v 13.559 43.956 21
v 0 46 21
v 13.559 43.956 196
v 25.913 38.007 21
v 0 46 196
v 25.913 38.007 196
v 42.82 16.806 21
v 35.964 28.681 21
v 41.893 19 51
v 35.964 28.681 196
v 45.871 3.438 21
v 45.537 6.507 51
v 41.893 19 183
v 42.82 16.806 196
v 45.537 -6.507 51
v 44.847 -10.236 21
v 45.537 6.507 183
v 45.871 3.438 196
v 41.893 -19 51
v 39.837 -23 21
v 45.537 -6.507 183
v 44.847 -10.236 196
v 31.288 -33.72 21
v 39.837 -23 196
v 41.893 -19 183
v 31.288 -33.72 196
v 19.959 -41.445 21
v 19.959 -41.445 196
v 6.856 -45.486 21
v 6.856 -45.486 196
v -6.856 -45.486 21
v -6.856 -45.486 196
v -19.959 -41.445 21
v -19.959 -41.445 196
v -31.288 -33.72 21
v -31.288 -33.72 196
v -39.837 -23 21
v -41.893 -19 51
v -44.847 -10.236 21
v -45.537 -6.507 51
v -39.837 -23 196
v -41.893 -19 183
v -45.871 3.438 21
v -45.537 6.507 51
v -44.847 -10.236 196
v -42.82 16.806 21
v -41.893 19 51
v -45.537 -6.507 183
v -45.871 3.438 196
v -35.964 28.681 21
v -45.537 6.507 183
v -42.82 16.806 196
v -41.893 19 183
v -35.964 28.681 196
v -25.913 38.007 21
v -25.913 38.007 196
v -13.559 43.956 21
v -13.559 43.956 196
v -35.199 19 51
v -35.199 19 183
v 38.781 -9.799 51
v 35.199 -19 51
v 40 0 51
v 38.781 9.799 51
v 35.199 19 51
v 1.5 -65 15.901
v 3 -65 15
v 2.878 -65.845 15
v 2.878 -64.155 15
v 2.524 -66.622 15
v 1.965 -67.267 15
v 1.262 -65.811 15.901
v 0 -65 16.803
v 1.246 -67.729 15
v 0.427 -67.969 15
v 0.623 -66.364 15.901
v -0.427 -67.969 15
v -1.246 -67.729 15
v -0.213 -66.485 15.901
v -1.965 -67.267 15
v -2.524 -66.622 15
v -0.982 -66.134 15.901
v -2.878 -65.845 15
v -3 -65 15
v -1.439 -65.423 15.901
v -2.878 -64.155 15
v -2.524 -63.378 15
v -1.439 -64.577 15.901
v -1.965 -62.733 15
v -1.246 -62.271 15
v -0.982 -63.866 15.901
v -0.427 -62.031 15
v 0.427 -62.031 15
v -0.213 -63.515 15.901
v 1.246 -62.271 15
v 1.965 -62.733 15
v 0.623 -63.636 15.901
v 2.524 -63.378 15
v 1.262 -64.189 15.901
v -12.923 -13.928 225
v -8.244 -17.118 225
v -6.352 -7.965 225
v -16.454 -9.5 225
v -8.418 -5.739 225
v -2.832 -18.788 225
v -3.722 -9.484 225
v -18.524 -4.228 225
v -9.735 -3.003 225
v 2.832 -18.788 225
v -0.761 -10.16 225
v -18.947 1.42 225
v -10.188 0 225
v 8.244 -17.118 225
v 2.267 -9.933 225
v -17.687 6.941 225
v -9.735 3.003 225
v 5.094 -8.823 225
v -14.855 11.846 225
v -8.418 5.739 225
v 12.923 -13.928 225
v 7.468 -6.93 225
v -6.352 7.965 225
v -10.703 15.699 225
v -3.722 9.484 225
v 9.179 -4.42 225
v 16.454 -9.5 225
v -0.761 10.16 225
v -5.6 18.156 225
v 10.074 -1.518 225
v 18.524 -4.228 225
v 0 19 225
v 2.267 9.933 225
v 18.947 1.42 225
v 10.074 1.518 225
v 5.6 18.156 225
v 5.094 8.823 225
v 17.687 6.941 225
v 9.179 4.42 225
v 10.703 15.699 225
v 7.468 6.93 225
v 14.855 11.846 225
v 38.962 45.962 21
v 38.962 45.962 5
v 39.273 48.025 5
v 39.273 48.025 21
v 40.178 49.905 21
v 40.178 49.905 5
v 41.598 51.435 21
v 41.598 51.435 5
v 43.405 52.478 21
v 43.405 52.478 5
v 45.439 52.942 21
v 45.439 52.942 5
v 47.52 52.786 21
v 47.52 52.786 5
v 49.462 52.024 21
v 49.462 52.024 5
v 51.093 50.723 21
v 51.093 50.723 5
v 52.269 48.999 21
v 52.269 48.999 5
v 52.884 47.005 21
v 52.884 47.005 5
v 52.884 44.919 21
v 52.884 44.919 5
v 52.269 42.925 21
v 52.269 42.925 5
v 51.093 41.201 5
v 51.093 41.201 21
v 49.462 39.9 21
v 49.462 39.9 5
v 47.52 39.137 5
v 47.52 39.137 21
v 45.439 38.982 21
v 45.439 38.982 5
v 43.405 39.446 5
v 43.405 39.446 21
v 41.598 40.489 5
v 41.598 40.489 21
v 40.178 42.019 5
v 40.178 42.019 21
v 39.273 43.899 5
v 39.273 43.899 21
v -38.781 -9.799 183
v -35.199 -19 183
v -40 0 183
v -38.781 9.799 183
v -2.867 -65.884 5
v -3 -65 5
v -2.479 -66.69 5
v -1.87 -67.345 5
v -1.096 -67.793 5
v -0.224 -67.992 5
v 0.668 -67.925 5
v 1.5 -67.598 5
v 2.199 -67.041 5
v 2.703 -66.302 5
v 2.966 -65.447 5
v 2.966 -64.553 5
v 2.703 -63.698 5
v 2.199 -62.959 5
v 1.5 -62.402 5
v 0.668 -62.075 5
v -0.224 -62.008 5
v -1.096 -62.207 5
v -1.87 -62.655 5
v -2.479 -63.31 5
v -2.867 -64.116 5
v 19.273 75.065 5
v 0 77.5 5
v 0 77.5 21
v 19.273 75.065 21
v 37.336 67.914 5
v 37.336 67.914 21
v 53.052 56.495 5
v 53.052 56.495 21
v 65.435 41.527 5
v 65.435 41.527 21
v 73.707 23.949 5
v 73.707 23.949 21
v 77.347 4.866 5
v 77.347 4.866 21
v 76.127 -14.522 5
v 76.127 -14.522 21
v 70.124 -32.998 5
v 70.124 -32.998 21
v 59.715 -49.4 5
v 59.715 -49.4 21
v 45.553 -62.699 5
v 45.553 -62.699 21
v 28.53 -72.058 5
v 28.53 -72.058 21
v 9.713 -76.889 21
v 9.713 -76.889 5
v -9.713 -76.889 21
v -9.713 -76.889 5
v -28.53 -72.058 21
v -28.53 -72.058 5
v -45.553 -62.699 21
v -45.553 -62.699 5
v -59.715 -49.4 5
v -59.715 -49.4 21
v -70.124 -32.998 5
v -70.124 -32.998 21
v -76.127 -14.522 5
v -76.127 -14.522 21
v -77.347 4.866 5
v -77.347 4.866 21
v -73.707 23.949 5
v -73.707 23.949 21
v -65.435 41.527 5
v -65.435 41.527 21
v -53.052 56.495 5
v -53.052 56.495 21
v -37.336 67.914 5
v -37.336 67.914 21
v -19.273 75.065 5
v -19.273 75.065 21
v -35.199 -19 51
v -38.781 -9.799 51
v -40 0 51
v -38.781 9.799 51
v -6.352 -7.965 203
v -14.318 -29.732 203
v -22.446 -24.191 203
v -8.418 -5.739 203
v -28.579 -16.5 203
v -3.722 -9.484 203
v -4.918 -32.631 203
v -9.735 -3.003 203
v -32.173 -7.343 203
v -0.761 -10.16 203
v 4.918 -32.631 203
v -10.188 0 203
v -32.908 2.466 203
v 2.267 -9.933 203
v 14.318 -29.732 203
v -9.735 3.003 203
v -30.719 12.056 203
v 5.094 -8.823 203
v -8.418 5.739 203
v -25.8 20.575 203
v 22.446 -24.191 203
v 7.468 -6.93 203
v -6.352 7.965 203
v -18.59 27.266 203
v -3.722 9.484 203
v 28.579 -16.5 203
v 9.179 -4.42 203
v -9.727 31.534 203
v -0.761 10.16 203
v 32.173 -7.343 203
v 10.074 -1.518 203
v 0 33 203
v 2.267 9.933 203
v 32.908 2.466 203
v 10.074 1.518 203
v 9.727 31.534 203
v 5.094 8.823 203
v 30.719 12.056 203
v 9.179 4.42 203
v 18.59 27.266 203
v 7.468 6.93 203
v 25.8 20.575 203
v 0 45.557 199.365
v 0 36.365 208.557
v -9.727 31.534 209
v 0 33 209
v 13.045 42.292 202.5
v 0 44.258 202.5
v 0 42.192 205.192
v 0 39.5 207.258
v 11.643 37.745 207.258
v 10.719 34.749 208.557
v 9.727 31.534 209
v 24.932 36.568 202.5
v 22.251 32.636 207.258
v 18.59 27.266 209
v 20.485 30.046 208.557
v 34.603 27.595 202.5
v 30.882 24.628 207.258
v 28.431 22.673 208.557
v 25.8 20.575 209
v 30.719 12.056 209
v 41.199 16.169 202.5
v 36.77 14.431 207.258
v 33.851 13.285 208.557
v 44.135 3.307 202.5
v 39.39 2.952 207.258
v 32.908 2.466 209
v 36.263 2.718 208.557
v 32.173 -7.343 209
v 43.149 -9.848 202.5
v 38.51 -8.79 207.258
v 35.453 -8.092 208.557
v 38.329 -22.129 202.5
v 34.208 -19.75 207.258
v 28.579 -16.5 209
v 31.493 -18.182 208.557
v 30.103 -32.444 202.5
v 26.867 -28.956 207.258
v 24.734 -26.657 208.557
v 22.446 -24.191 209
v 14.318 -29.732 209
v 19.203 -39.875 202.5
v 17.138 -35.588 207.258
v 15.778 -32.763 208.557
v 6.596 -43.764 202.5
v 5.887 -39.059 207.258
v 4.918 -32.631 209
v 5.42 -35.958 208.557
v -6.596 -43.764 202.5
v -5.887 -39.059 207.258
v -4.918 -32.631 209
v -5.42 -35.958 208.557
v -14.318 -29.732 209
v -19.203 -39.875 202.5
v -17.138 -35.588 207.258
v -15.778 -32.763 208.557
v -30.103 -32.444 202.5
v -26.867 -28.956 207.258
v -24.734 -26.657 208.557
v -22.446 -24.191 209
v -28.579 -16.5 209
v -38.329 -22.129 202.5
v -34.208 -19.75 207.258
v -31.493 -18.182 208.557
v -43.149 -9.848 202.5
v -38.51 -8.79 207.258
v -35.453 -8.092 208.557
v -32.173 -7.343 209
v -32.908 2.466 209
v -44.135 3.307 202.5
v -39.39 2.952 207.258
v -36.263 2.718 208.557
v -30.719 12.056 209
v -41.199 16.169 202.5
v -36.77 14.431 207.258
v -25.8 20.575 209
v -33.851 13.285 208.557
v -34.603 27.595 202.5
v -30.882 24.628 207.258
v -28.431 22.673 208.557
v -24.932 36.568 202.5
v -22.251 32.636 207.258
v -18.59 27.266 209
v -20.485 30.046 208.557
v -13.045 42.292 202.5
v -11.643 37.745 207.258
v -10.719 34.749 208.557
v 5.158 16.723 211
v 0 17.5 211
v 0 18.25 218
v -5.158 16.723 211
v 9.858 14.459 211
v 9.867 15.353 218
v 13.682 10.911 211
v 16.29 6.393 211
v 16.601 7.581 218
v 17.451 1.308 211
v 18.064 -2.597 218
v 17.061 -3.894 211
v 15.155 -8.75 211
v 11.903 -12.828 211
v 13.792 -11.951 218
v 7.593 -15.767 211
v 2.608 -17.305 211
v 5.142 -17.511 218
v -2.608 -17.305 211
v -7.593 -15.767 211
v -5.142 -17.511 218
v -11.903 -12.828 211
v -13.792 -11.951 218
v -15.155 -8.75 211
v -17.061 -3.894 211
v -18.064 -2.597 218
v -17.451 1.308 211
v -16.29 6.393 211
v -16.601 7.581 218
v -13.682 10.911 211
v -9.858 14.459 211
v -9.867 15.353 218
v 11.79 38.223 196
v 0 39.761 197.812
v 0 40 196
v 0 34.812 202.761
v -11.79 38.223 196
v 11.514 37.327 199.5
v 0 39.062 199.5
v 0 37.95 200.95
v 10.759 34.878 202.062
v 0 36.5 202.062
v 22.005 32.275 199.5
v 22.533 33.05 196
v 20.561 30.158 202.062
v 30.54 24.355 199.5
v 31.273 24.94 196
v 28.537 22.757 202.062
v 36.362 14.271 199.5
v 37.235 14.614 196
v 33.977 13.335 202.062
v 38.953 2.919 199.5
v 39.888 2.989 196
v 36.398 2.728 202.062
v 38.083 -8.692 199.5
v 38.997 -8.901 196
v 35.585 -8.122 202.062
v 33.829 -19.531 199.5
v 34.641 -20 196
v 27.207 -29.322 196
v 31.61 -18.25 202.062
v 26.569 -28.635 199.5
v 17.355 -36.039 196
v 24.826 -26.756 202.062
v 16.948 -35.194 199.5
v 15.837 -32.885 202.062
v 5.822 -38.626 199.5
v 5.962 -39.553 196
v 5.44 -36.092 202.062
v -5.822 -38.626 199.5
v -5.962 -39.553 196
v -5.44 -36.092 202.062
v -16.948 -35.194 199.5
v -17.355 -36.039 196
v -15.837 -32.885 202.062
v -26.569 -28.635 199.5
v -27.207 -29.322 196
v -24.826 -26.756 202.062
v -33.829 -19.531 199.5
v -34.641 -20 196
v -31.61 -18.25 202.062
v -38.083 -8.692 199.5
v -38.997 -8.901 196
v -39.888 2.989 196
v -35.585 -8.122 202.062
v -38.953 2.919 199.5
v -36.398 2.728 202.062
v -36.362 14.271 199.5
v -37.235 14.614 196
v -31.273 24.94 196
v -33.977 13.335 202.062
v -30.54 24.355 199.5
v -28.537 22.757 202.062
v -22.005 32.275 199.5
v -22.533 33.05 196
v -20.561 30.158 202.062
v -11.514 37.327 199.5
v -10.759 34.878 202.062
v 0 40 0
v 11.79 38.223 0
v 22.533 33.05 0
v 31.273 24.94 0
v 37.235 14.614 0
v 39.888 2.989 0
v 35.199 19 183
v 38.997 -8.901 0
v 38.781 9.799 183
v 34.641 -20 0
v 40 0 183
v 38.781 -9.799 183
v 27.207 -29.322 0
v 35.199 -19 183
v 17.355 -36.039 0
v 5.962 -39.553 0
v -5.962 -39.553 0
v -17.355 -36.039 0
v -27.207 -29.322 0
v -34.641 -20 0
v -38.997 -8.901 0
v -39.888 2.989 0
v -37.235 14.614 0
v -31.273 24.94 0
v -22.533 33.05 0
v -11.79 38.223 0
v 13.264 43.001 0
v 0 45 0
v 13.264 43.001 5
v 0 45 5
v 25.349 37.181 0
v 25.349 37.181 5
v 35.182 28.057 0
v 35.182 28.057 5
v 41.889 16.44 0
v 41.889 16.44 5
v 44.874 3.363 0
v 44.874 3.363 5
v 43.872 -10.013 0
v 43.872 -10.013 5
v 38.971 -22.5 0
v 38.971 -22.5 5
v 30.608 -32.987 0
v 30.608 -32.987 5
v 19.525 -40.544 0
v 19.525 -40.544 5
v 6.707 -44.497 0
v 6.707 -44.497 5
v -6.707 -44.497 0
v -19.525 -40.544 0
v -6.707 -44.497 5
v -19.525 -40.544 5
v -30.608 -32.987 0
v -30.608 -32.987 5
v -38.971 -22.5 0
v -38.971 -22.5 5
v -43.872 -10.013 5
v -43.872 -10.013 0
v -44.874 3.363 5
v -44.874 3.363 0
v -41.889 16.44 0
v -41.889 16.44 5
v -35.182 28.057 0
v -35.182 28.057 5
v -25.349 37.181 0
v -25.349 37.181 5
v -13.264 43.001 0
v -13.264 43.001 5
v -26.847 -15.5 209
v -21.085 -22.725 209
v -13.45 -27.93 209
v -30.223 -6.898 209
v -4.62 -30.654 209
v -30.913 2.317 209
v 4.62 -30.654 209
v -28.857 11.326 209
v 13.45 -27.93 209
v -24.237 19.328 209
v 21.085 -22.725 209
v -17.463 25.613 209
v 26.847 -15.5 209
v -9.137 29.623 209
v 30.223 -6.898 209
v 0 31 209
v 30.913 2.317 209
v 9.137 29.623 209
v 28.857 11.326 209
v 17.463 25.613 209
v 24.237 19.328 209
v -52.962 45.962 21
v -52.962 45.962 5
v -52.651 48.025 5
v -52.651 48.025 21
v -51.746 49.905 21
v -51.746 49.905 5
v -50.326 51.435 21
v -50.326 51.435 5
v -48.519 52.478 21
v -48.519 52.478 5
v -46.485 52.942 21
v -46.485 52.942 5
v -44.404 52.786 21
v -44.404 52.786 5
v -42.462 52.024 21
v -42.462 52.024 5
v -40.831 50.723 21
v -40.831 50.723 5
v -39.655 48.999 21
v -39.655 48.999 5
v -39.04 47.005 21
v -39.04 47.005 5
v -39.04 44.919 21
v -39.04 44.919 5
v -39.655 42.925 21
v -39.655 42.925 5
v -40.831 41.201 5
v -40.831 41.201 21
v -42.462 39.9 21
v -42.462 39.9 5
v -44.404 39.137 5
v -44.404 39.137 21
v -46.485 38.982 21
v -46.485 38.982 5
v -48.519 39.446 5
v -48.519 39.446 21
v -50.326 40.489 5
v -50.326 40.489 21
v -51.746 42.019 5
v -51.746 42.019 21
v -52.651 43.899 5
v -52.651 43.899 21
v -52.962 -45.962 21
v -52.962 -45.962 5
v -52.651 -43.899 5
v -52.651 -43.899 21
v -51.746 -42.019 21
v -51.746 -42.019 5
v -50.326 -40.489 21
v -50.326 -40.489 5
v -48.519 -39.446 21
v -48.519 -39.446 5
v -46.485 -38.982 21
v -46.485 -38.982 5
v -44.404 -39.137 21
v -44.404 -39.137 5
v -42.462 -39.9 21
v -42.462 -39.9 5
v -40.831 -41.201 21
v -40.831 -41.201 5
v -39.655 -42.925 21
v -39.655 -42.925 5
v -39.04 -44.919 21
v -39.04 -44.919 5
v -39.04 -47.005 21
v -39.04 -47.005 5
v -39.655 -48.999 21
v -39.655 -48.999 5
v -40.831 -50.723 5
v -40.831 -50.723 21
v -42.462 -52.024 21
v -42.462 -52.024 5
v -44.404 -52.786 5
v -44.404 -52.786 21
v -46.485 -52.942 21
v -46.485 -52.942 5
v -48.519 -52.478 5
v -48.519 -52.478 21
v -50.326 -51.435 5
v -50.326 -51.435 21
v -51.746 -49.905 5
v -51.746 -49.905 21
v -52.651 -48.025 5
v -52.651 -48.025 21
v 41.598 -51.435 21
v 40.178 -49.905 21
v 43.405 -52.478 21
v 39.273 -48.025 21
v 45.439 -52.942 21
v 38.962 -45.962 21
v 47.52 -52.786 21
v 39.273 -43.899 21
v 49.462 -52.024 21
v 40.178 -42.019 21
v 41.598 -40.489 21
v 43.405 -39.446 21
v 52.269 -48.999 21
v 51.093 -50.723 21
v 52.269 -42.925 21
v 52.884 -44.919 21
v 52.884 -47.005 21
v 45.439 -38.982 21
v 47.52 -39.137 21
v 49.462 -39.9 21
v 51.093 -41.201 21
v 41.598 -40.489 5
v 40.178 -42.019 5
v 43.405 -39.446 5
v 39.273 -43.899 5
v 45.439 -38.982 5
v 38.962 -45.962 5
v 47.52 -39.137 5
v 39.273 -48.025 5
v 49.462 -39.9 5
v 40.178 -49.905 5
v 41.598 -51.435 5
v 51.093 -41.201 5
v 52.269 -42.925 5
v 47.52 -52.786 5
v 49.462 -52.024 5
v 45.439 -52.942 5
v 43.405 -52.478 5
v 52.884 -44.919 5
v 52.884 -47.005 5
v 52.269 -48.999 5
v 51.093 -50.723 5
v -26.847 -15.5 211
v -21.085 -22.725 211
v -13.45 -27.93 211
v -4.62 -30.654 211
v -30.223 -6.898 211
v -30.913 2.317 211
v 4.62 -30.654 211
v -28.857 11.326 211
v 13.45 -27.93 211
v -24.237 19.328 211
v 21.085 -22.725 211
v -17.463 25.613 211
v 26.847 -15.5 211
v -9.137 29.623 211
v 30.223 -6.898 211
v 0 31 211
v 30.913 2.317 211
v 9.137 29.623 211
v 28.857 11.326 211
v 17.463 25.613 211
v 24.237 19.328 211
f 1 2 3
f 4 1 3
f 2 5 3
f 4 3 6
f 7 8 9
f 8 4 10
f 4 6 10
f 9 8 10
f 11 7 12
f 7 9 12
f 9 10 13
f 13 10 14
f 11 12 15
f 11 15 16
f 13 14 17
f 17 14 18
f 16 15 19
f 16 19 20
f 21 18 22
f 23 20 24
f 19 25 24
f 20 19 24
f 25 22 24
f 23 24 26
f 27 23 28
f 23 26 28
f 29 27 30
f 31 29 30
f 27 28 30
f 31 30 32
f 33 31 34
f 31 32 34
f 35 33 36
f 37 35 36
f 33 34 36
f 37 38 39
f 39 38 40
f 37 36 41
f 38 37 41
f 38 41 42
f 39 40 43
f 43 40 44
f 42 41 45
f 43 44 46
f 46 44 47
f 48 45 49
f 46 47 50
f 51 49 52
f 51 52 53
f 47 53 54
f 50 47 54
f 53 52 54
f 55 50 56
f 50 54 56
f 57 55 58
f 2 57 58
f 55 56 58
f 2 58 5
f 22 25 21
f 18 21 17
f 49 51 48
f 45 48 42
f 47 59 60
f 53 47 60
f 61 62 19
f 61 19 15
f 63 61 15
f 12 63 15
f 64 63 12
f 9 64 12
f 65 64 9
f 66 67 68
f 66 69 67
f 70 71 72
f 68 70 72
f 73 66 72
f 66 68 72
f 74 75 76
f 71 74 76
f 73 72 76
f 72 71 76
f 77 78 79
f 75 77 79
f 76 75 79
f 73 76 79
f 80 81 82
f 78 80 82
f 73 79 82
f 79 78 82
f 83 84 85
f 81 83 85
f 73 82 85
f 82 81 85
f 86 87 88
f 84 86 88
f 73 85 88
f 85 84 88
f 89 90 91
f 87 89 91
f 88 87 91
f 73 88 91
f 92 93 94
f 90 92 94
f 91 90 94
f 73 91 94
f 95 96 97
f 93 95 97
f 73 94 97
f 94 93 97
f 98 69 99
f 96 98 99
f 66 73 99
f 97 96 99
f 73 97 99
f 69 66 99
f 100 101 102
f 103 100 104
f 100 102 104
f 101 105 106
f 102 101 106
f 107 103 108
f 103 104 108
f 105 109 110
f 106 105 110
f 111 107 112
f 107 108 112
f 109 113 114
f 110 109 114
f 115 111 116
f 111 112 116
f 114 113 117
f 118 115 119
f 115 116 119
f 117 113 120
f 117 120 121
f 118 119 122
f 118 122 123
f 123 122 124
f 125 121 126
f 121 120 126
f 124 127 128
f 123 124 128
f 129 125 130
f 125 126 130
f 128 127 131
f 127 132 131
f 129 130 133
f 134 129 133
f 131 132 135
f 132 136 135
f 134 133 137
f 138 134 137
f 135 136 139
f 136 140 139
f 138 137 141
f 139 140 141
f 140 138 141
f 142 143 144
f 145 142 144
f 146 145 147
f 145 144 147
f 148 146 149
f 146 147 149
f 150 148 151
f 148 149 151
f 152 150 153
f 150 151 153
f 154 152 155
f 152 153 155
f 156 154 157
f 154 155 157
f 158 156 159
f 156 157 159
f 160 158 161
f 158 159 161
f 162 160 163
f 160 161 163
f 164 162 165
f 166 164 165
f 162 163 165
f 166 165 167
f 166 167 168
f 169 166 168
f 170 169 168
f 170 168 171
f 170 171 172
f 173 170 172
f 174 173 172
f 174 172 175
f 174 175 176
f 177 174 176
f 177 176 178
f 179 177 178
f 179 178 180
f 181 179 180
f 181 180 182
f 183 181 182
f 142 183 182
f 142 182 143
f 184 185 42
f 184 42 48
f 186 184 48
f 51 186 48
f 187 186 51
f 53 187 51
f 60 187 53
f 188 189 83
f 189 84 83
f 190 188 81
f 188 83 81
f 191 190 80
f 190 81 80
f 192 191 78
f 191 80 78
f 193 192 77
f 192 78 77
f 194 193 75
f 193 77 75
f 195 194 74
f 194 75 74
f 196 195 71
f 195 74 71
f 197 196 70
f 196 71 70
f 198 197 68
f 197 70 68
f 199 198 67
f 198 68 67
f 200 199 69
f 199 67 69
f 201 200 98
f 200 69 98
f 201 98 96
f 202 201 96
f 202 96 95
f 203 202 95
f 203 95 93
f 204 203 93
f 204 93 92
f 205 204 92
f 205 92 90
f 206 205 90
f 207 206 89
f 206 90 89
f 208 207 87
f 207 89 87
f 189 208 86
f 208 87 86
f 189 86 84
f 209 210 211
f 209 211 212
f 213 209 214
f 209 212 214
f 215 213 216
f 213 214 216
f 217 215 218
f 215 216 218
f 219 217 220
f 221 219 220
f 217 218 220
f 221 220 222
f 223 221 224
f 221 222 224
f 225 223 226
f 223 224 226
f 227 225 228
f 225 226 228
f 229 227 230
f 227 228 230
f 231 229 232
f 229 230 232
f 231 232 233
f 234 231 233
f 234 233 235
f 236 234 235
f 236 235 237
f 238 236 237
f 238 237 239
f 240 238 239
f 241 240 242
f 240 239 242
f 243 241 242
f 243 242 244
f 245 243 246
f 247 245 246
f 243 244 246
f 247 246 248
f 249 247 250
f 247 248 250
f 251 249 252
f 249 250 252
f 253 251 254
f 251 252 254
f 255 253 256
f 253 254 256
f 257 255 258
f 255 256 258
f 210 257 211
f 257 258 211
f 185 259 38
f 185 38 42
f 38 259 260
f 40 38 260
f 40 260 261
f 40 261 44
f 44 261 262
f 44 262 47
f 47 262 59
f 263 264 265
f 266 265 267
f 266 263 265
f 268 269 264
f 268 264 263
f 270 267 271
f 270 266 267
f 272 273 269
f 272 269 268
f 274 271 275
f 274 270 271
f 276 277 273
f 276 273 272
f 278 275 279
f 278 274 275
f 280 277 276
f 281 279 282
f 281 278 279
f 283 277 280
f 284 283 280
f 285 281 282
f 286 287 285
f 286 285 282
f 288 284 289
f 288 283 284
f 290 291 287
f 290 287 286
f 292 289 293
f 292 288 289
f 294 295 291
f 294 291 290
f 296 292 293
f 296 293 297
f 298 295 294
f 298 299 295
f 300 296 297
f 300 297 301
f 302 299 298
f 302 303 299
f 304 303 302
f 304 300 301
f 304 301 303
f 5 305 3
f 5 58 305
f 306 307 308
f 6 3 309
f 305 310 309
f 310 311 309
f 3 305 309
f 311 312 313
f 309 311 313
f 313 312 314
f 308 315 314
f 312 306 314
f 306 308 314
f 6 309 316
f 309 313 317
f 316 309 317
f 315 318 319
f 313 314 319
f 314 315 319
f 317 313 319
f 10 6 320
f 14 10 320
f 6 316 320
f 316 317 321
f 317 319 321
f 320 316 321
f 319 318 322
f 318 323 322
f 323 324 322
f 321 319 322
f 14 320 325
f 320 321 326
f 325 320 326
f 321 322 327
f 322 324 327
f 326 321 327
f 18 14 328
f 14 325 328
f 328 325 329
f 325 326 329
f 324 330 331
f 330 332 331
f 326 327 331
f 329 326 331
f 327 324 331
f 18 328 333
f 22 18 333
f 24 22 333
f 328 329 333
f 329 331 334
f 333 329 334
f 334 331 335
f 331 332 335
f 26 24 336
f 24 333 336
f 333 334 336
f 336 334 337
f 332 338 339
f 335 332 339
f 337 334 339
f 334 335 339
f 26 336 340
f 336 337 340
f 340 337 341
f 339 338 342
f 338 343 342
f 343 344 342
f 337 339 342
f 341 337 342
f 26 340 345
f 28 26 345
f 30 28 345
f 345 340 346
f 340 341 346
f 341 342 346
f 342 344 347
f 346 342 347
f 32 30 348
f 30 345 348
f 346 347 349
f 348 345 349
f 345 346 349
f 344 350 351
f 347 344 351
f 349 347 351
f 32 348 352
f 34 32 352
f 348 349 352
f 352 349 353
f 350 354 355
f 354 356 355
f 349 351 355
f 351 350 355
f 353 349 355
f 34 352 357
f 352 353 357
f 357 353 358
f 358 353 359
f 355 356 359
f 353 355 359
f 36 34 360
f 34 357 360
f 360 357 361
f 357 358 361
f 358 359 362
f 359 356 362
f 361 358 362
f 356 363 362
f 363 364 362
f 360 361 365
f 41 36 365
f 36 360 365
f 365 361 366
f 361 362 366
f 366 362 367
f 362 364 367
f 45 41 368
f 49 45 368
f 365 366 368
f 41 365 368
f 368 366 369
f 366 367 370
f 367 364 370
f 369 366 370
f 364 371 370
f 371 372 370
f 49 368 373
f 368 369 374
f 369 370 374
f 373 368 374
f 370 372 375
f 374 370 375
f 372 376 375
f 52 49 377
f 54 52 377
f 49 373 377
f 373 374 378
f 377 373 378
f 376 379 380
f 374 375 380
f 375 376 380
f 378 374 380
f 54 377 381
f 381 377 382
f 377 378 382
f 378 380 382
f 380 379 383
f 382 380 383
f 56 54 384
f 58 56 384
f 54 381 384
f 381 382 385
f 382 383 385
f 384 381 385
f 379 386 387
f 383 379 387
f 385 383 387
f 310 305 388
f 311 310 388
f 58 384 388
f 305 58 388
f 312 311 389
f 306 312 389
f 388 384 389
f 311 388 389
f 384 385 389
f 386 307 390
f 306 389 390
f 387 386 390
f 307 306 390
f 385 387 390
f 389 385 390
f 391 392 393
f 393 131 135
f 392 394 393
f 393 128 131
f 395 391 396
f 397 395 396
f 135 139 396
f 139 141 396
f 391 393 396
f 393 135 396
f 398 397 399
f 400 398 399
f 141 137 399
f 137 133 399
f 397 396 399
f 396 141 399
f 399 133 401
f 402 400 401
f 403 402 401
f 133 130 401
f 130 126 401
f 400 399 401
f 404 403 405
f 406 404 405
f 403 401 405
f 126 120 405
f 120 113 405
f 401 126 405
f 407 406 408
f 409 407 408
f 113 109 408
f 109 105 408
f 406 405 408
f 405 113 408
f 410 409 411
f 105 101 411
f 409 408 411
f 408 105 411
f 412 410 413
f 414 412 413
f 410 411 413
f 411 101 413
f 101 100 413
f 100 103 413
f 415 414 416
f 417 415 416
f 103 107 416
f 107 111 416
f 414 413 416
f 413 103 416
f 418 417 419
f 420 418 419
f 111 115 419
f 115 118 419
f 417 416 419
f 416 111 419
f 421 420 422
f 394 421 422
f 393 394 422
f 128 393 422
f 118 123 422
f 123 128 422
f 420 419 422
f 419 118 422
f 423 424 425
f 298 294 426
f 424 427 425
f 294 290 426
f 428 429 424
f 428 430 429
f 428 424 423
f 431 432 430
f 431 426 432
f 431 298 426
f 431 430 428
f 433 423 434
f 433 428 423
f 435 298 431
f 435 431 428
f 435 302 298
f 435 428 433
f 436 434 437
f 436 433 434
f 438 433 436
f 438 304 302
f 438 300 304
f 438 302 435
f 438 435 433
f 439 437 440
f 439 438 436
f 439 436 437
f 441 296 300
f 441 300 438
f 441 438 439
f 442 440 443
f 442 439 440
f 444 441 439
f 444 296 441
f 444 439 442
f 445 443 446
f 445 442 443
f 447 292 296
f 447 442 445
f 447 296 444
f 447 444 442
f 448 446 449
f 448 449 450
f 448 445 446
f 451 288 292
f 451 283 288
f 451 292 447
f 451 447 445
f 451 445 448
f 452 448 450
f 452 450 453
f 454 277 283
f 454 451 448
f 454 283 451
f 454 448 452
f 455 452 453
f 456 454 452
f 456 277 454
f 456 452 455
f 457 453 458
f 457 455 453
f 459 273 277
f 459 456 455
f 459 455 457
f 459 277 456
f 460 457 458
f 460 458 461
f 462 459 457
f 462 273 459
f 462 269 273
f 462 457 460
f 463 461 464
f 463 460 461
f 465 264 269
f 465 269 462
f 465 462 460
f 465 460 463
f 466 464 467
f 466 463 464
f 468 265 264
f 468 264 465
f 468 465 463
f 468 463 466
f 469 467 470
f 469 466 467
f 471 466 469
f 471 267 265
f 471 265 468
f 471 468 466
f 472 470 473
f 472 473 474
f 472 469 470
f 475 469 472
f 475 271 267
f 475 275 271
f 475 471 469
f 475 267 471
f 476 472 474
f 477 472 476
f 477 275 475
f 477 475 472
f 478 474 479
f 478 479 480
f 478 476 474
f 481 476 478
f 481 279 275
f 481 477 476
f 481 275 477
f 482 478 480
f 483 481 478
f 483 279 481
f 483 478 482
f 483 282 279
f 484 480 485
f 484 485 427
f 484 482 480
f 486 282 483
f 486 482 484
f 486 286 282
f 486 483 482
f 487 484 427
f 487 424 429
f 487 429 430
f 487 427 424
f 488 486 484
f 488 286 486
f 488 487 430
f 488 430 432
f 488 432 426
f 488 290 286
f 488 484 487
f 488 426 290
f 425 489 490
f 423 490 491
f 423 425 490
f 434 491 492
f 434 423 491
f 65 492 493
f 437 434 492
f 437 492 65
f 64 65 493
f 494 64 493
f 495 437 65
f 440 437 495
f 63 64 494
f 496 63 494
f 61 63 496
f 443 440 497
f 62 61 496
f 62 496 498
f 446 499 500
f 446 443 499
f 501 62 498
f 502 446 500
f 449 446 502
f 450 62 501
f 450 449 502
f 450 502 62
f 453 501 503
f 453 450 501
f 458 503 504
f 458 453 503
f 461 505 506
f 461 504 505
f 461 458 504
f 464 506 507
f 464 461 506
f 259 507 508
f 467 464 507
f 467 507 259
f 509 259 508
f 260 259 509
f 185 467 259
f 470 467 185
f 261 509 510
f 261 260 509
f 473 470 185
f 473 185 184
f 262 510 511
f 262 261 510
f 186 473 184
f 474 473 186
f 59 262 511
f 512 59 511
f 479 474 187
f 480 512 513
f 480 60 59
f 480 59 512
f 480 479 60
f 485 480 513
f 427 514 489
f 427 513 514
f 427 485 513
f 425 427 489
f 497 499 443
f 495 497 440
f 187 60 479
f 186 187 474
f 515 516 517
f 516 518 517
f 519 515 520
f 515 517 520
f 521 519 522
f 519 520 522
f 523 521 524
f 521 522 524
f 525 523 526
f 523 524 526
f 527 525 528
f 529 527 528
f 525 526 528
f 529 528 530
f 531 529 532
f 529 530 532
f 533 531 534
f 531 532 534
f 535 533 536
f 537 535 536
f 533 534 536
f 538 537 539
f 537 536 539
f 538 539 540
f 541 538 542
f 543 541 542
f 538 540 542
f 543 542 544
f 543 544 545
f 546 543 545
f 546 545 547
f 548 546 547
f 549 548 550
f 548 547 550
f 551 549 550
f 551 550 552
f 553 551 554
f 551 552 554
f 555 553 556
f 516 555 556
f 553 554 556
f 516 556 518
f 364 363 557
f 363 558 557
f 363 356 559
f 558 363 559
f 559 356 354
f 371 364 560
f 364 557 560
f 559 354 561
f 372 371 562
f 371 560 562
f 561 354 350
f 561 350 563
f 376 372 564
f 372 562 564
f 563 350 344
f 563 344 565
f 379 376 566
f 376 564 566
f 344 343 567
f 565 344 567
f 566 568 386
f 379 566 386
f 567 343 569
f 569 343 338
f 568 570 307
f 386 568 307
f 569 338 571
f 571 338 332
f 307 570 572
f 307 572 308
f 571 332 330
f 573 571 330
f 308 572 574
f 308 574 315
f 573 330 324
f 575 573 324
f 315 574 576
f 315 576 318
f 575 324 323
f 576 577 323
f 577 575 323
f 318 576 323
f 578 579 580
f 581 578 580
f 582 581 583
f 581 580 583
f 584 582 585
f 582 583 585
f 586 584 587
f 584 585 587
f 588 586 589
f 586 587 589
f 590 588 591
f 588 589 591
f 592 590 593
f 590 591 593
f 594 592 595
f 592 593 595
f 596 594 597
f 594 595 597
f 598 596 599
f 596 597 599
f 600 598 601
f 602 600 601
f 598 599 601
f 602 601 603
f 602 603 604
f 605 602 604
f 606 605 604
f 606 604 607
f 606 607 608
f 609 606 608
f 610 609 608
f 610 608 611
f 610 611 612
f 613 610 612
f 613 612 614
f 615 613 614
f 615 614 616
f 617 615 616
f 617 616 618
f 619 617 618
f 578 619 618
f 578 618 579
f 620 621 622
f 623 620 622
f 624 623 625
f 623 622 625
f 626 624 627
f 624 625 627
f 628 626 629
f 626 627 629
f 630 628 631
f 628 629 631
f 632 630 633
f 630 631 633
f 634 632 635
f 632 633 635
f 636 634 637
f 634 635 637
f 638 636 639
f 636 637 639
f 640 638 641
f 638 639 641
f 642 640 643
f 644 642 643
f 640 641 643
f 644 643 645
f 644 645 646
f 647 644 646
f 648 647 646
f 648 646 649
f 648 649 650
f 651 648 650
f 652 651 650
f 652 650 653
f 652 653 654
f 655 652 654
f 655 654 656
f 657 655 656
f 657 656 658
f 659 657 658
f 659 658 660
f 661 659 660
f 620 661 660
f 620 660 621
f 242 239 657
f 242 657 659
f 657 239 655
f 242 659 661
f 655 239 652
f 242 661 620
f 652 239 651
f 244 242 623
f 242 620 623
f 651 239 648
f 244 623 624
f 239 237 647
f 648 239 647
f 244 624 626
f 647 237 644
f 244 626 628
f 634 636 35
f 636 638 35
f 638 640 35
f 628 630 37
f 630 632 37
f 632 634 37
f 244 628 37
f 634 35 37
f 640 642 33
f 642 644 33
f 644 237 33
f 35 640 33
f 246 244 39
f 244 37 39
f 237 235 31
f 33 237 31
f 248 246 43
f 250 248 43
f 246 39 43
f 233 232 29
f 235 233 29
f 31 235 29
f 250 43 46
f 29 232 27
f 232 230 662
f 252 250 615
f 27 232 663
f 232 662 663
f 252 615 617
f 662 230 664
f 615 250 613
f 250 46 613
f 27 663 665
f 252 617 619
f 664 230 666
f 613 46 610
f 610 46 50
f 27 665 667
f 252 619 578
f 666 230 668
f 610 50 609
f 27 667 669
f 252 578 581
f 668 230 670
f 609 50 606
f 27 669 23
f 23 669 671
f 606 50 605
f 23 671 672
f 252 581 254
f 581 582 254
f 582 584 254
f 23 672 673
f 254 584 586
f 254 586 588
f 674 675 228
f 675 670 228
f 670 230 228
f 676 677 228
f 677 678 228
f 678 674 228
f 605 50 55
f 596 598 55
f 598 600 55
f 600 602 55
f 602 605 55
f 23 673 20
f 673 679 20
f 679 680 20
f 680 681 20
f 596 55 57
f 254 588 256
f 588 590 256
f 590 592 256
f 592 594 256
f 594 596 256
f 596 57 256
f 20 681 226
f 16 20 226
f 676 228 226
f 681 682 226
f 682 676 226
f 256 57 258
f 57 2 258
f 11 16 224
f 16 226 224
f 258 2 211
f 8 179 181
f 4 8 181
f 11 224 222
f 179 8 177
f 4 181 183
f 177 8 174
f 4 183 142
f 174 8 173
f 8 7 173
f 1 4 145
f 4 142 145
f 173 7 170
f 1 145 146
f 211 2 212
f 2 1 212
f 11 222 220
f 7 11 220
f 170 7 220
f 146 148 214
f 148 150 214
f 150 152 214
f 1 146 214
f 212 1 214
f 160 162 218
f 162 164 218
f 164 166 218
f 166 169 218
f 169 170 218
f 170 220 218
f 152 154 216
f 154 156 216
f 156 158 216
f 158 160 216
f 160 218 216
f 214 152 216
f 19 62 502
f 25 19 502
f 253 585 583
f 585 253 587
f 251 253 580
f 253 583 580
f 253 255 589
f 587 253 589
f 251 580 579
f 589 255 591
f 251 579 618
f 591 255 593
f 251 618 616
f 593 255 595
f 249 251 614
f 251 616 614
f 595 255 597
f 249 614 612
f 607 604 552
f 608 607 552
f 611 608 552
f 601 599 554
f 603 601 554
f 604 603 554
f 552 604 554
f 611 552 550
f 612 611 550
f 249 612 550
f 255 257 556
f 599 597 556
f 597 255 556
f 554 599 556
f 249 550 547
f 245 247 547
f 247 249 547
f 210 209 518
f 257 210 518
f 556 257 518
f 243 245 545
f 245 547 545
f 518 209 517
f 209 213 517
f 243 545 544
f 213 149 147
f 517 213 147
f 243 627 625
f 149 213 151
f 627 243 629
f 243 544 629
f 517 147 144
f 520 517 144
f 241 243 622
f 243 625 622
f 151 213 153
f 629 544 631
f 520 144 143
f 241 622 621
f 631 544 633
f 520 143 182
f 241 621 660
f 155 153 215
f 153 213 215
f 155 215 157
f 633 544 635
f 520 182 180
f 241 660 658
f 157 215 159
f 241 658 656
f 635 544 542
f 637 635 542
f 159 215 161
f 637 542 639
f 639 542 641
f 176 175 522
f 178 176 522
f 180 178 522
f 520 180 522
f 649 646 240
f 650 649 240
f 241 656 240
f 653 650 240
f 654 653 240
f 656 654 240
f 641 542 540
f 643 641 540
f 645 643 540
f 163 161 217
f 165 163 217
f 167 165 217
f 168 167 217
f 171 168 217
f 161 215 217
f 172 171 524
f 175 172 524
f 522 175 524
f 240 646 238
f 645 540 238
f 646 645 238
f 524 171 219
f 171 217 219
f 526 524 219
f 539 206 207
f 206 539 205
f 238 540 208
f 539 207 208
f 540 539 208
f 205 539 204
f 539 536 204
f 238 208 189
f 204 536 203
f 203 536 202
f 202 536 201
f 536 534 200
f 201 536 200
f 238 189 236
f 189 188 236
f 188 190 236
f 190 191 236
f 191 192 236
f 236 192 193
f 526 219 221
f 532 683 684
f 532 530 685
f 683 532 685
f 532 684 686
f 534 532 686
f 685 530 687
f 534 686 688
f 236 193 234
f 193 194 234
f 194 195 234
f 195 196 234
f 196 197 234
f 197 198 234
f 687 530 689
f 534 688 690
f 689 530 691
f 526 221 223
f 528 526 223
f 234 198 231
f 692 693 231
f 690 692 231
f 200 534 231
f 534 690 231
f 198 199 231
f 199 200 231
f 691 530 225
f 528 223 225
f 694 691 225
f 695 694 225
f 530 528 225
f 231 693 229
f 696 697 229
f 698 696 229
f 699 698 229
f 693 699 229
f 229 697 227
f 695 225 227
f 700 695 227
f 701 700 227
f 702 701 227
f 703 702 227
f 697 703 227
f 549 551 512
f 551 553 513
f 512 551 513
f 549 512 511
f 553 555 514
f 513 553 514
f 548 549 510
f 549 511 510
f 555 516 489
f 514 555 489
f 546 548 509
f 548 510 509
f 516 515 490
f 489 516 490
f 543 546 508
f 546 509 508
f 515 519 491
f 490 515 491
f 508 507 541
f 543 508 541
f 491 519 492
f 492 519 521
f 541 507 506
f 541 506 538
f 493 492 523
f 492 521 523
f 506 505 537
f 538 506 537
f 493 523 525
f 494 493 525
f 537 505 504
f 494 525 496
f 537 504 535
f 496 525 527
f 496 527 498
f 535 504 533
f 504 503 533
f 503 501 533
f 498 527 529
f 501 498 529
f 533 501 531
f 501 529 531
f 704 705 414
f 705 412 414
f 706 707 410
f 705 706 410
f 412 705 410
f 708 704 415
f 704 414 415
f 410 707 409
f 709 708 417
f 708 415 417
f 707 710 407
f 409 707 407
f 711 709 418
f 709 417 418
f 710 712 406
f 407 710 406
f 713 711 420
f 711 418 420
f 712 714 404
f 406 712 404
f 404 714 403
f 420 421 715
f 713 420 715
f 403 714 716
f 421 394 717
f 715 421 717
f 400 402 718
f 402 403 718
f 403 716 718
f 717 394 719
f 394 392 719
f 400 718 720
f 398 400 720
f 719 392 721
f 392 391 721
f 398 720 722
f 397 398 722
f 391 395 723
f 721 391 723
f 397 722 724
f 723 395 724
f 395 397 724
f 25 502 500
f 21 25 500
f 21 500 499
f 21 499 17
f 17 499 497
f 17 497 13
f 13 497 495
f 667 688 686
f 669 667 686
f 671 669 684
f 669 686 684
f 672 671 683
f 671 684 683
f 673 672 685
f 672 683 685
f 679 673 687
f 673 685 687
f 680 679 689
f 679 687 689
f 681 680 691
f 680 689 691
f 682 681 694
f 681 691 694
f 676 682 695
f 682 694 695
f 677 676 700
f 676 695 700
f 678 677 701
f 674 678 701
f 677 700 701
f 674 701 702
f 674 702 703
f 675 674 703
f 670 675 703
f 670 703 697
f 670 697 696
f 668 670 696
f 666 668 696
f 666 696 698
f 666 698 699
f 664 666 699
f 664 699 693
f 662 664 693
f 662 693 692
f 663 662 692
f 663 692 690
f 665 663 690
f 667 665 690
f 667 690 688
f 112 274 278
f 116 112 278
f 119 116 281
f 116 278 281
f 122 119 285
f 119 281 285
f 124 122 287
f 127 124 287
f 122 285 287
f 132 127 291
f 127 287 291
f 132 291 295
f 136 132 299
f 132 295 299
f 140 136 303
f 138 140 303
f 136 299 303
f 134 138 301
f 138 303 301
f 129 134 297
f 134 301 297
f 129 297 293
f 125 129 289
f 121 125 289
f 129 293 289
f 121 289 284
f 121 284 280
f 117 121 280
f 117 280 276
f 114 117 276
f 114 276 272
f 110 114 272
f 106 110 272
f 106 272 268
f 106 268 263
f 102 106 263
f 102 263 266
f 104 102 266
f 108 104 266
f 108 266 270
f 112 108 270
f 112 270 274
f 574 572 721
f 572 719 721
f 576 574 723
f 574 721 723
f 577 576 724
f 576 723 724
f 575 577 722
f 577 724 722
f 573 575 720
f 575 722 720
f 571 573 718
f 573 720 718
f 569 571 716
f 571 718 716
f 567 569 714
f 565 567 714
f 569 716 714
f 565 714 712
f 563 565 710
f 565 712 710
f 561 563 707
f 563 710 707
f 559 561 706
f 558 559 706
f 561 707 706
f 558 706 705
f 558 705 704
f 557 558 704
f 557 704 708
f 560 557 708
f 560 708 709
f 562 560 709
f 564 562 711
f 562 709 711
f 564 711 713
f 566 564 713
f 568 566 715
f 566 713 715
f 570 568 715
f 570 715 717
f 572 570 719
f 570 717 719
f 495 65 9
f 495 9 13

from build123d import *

# Parameters (mm, degrees)
F5_D          = 20.376
F7_D          = 14
F8_W          = 38
F8_H          = 132
F9_DEPTH      = 77.501
F9_DEPTH_BACK = 77.501
F11_D         = 6
F11_DEPTH     = 10
F11_TIP       = 1.8025818571


with BuildPart() as f1:
    # F0 (on Right) → F1 (revolve)
    with BuildSketch(Plane.YZ):
        with BuildLine():
            Line((19, 225), (0, 225))
            Line((0, 225), (0, 0))
            Line((0, 0), (45, 0))
            Line((45, 0), (45, 5))
            Line((45, 5), (77.5, 5))
            Line((77.5, 5), (77.5, 21))
            Line((77.5, 21), (46, 21))
            Line((46, 21), (46, 196))
            ThreePointArc((46, 196), (42.1923881554, 205.1923881554), (33, 209))
            Line((33, 209), (31, 209))
            Line((31, 209), (31, 211))
            Line((31, 211), (17.5, 211))
            Line((17.5, 211), (19, 225))
        make_face()
    revolve(axis=Axis((0, 0, 103.9262376726), (0, 0, -1)))

    # F2 (on Right) → F3 (revolve, cut)
    with BuildSketch(Plane.YZ):
        with BuildLine():
            Line((33, 203), (0, 203))
            Line((0, 203), (0, -6))
            Line((0, -6), (40, -6))
            Line((40, -6), (40, 196))
            ThreePointArc((40, 196), (37.9497474683, 200.9497474683), (33, 203))
        make_face()
    revolve(axis=Axis((0, 0, 103.9262376726), (0, 0, -1)), mode=Mode.SUBTRACT)

    # F5 (through all)
    with Locations(Plane.XY.offset(225)):
        with Locations((0, 0)):
            Hole(F5_D / 2)

    # F7 (through all)
    with Locations(Plane.XY.offset(21)):
        with Locations((45.9619407771, 45.9619407771), (45.9619407771, -45.9619407771), (-45.9619407771, 45.9619407771), (-45.9619407771, -45.9619407771)):
            Hole(F7_D / 2)

    # F8 (on Right) → F9 (cut, two sides)
    with BuildSketch(Plane.YZ) as f9_sk:
        with Locations((0, 117)):
            Rectangle(F8_W, F8_H)
    extrude(amount=-F9_DEPTH, mode=Mode.SUBTRACT)
    extrude(f9_sk.sketch, amount=F9_DEPTH_BACK, mode=Mode.SUBTRACT)

    # F11
    with Locations(Plane(origin=(0, 0, 5), x_dir=(1, 0, 0), z_dir=(0, 0, -1))):
        with Locations((0, 65)):
            Hole(F11_D / 2, depth=F11_DEPTH)
            with Locations((0, 0, -(F11_DEPTH + F11_TIP / 2))):  # 118° drill point
                Cone(0, F11_D / 2, F11_TIP, mode=Mode.SUBTRACT)


solid = f1.part
